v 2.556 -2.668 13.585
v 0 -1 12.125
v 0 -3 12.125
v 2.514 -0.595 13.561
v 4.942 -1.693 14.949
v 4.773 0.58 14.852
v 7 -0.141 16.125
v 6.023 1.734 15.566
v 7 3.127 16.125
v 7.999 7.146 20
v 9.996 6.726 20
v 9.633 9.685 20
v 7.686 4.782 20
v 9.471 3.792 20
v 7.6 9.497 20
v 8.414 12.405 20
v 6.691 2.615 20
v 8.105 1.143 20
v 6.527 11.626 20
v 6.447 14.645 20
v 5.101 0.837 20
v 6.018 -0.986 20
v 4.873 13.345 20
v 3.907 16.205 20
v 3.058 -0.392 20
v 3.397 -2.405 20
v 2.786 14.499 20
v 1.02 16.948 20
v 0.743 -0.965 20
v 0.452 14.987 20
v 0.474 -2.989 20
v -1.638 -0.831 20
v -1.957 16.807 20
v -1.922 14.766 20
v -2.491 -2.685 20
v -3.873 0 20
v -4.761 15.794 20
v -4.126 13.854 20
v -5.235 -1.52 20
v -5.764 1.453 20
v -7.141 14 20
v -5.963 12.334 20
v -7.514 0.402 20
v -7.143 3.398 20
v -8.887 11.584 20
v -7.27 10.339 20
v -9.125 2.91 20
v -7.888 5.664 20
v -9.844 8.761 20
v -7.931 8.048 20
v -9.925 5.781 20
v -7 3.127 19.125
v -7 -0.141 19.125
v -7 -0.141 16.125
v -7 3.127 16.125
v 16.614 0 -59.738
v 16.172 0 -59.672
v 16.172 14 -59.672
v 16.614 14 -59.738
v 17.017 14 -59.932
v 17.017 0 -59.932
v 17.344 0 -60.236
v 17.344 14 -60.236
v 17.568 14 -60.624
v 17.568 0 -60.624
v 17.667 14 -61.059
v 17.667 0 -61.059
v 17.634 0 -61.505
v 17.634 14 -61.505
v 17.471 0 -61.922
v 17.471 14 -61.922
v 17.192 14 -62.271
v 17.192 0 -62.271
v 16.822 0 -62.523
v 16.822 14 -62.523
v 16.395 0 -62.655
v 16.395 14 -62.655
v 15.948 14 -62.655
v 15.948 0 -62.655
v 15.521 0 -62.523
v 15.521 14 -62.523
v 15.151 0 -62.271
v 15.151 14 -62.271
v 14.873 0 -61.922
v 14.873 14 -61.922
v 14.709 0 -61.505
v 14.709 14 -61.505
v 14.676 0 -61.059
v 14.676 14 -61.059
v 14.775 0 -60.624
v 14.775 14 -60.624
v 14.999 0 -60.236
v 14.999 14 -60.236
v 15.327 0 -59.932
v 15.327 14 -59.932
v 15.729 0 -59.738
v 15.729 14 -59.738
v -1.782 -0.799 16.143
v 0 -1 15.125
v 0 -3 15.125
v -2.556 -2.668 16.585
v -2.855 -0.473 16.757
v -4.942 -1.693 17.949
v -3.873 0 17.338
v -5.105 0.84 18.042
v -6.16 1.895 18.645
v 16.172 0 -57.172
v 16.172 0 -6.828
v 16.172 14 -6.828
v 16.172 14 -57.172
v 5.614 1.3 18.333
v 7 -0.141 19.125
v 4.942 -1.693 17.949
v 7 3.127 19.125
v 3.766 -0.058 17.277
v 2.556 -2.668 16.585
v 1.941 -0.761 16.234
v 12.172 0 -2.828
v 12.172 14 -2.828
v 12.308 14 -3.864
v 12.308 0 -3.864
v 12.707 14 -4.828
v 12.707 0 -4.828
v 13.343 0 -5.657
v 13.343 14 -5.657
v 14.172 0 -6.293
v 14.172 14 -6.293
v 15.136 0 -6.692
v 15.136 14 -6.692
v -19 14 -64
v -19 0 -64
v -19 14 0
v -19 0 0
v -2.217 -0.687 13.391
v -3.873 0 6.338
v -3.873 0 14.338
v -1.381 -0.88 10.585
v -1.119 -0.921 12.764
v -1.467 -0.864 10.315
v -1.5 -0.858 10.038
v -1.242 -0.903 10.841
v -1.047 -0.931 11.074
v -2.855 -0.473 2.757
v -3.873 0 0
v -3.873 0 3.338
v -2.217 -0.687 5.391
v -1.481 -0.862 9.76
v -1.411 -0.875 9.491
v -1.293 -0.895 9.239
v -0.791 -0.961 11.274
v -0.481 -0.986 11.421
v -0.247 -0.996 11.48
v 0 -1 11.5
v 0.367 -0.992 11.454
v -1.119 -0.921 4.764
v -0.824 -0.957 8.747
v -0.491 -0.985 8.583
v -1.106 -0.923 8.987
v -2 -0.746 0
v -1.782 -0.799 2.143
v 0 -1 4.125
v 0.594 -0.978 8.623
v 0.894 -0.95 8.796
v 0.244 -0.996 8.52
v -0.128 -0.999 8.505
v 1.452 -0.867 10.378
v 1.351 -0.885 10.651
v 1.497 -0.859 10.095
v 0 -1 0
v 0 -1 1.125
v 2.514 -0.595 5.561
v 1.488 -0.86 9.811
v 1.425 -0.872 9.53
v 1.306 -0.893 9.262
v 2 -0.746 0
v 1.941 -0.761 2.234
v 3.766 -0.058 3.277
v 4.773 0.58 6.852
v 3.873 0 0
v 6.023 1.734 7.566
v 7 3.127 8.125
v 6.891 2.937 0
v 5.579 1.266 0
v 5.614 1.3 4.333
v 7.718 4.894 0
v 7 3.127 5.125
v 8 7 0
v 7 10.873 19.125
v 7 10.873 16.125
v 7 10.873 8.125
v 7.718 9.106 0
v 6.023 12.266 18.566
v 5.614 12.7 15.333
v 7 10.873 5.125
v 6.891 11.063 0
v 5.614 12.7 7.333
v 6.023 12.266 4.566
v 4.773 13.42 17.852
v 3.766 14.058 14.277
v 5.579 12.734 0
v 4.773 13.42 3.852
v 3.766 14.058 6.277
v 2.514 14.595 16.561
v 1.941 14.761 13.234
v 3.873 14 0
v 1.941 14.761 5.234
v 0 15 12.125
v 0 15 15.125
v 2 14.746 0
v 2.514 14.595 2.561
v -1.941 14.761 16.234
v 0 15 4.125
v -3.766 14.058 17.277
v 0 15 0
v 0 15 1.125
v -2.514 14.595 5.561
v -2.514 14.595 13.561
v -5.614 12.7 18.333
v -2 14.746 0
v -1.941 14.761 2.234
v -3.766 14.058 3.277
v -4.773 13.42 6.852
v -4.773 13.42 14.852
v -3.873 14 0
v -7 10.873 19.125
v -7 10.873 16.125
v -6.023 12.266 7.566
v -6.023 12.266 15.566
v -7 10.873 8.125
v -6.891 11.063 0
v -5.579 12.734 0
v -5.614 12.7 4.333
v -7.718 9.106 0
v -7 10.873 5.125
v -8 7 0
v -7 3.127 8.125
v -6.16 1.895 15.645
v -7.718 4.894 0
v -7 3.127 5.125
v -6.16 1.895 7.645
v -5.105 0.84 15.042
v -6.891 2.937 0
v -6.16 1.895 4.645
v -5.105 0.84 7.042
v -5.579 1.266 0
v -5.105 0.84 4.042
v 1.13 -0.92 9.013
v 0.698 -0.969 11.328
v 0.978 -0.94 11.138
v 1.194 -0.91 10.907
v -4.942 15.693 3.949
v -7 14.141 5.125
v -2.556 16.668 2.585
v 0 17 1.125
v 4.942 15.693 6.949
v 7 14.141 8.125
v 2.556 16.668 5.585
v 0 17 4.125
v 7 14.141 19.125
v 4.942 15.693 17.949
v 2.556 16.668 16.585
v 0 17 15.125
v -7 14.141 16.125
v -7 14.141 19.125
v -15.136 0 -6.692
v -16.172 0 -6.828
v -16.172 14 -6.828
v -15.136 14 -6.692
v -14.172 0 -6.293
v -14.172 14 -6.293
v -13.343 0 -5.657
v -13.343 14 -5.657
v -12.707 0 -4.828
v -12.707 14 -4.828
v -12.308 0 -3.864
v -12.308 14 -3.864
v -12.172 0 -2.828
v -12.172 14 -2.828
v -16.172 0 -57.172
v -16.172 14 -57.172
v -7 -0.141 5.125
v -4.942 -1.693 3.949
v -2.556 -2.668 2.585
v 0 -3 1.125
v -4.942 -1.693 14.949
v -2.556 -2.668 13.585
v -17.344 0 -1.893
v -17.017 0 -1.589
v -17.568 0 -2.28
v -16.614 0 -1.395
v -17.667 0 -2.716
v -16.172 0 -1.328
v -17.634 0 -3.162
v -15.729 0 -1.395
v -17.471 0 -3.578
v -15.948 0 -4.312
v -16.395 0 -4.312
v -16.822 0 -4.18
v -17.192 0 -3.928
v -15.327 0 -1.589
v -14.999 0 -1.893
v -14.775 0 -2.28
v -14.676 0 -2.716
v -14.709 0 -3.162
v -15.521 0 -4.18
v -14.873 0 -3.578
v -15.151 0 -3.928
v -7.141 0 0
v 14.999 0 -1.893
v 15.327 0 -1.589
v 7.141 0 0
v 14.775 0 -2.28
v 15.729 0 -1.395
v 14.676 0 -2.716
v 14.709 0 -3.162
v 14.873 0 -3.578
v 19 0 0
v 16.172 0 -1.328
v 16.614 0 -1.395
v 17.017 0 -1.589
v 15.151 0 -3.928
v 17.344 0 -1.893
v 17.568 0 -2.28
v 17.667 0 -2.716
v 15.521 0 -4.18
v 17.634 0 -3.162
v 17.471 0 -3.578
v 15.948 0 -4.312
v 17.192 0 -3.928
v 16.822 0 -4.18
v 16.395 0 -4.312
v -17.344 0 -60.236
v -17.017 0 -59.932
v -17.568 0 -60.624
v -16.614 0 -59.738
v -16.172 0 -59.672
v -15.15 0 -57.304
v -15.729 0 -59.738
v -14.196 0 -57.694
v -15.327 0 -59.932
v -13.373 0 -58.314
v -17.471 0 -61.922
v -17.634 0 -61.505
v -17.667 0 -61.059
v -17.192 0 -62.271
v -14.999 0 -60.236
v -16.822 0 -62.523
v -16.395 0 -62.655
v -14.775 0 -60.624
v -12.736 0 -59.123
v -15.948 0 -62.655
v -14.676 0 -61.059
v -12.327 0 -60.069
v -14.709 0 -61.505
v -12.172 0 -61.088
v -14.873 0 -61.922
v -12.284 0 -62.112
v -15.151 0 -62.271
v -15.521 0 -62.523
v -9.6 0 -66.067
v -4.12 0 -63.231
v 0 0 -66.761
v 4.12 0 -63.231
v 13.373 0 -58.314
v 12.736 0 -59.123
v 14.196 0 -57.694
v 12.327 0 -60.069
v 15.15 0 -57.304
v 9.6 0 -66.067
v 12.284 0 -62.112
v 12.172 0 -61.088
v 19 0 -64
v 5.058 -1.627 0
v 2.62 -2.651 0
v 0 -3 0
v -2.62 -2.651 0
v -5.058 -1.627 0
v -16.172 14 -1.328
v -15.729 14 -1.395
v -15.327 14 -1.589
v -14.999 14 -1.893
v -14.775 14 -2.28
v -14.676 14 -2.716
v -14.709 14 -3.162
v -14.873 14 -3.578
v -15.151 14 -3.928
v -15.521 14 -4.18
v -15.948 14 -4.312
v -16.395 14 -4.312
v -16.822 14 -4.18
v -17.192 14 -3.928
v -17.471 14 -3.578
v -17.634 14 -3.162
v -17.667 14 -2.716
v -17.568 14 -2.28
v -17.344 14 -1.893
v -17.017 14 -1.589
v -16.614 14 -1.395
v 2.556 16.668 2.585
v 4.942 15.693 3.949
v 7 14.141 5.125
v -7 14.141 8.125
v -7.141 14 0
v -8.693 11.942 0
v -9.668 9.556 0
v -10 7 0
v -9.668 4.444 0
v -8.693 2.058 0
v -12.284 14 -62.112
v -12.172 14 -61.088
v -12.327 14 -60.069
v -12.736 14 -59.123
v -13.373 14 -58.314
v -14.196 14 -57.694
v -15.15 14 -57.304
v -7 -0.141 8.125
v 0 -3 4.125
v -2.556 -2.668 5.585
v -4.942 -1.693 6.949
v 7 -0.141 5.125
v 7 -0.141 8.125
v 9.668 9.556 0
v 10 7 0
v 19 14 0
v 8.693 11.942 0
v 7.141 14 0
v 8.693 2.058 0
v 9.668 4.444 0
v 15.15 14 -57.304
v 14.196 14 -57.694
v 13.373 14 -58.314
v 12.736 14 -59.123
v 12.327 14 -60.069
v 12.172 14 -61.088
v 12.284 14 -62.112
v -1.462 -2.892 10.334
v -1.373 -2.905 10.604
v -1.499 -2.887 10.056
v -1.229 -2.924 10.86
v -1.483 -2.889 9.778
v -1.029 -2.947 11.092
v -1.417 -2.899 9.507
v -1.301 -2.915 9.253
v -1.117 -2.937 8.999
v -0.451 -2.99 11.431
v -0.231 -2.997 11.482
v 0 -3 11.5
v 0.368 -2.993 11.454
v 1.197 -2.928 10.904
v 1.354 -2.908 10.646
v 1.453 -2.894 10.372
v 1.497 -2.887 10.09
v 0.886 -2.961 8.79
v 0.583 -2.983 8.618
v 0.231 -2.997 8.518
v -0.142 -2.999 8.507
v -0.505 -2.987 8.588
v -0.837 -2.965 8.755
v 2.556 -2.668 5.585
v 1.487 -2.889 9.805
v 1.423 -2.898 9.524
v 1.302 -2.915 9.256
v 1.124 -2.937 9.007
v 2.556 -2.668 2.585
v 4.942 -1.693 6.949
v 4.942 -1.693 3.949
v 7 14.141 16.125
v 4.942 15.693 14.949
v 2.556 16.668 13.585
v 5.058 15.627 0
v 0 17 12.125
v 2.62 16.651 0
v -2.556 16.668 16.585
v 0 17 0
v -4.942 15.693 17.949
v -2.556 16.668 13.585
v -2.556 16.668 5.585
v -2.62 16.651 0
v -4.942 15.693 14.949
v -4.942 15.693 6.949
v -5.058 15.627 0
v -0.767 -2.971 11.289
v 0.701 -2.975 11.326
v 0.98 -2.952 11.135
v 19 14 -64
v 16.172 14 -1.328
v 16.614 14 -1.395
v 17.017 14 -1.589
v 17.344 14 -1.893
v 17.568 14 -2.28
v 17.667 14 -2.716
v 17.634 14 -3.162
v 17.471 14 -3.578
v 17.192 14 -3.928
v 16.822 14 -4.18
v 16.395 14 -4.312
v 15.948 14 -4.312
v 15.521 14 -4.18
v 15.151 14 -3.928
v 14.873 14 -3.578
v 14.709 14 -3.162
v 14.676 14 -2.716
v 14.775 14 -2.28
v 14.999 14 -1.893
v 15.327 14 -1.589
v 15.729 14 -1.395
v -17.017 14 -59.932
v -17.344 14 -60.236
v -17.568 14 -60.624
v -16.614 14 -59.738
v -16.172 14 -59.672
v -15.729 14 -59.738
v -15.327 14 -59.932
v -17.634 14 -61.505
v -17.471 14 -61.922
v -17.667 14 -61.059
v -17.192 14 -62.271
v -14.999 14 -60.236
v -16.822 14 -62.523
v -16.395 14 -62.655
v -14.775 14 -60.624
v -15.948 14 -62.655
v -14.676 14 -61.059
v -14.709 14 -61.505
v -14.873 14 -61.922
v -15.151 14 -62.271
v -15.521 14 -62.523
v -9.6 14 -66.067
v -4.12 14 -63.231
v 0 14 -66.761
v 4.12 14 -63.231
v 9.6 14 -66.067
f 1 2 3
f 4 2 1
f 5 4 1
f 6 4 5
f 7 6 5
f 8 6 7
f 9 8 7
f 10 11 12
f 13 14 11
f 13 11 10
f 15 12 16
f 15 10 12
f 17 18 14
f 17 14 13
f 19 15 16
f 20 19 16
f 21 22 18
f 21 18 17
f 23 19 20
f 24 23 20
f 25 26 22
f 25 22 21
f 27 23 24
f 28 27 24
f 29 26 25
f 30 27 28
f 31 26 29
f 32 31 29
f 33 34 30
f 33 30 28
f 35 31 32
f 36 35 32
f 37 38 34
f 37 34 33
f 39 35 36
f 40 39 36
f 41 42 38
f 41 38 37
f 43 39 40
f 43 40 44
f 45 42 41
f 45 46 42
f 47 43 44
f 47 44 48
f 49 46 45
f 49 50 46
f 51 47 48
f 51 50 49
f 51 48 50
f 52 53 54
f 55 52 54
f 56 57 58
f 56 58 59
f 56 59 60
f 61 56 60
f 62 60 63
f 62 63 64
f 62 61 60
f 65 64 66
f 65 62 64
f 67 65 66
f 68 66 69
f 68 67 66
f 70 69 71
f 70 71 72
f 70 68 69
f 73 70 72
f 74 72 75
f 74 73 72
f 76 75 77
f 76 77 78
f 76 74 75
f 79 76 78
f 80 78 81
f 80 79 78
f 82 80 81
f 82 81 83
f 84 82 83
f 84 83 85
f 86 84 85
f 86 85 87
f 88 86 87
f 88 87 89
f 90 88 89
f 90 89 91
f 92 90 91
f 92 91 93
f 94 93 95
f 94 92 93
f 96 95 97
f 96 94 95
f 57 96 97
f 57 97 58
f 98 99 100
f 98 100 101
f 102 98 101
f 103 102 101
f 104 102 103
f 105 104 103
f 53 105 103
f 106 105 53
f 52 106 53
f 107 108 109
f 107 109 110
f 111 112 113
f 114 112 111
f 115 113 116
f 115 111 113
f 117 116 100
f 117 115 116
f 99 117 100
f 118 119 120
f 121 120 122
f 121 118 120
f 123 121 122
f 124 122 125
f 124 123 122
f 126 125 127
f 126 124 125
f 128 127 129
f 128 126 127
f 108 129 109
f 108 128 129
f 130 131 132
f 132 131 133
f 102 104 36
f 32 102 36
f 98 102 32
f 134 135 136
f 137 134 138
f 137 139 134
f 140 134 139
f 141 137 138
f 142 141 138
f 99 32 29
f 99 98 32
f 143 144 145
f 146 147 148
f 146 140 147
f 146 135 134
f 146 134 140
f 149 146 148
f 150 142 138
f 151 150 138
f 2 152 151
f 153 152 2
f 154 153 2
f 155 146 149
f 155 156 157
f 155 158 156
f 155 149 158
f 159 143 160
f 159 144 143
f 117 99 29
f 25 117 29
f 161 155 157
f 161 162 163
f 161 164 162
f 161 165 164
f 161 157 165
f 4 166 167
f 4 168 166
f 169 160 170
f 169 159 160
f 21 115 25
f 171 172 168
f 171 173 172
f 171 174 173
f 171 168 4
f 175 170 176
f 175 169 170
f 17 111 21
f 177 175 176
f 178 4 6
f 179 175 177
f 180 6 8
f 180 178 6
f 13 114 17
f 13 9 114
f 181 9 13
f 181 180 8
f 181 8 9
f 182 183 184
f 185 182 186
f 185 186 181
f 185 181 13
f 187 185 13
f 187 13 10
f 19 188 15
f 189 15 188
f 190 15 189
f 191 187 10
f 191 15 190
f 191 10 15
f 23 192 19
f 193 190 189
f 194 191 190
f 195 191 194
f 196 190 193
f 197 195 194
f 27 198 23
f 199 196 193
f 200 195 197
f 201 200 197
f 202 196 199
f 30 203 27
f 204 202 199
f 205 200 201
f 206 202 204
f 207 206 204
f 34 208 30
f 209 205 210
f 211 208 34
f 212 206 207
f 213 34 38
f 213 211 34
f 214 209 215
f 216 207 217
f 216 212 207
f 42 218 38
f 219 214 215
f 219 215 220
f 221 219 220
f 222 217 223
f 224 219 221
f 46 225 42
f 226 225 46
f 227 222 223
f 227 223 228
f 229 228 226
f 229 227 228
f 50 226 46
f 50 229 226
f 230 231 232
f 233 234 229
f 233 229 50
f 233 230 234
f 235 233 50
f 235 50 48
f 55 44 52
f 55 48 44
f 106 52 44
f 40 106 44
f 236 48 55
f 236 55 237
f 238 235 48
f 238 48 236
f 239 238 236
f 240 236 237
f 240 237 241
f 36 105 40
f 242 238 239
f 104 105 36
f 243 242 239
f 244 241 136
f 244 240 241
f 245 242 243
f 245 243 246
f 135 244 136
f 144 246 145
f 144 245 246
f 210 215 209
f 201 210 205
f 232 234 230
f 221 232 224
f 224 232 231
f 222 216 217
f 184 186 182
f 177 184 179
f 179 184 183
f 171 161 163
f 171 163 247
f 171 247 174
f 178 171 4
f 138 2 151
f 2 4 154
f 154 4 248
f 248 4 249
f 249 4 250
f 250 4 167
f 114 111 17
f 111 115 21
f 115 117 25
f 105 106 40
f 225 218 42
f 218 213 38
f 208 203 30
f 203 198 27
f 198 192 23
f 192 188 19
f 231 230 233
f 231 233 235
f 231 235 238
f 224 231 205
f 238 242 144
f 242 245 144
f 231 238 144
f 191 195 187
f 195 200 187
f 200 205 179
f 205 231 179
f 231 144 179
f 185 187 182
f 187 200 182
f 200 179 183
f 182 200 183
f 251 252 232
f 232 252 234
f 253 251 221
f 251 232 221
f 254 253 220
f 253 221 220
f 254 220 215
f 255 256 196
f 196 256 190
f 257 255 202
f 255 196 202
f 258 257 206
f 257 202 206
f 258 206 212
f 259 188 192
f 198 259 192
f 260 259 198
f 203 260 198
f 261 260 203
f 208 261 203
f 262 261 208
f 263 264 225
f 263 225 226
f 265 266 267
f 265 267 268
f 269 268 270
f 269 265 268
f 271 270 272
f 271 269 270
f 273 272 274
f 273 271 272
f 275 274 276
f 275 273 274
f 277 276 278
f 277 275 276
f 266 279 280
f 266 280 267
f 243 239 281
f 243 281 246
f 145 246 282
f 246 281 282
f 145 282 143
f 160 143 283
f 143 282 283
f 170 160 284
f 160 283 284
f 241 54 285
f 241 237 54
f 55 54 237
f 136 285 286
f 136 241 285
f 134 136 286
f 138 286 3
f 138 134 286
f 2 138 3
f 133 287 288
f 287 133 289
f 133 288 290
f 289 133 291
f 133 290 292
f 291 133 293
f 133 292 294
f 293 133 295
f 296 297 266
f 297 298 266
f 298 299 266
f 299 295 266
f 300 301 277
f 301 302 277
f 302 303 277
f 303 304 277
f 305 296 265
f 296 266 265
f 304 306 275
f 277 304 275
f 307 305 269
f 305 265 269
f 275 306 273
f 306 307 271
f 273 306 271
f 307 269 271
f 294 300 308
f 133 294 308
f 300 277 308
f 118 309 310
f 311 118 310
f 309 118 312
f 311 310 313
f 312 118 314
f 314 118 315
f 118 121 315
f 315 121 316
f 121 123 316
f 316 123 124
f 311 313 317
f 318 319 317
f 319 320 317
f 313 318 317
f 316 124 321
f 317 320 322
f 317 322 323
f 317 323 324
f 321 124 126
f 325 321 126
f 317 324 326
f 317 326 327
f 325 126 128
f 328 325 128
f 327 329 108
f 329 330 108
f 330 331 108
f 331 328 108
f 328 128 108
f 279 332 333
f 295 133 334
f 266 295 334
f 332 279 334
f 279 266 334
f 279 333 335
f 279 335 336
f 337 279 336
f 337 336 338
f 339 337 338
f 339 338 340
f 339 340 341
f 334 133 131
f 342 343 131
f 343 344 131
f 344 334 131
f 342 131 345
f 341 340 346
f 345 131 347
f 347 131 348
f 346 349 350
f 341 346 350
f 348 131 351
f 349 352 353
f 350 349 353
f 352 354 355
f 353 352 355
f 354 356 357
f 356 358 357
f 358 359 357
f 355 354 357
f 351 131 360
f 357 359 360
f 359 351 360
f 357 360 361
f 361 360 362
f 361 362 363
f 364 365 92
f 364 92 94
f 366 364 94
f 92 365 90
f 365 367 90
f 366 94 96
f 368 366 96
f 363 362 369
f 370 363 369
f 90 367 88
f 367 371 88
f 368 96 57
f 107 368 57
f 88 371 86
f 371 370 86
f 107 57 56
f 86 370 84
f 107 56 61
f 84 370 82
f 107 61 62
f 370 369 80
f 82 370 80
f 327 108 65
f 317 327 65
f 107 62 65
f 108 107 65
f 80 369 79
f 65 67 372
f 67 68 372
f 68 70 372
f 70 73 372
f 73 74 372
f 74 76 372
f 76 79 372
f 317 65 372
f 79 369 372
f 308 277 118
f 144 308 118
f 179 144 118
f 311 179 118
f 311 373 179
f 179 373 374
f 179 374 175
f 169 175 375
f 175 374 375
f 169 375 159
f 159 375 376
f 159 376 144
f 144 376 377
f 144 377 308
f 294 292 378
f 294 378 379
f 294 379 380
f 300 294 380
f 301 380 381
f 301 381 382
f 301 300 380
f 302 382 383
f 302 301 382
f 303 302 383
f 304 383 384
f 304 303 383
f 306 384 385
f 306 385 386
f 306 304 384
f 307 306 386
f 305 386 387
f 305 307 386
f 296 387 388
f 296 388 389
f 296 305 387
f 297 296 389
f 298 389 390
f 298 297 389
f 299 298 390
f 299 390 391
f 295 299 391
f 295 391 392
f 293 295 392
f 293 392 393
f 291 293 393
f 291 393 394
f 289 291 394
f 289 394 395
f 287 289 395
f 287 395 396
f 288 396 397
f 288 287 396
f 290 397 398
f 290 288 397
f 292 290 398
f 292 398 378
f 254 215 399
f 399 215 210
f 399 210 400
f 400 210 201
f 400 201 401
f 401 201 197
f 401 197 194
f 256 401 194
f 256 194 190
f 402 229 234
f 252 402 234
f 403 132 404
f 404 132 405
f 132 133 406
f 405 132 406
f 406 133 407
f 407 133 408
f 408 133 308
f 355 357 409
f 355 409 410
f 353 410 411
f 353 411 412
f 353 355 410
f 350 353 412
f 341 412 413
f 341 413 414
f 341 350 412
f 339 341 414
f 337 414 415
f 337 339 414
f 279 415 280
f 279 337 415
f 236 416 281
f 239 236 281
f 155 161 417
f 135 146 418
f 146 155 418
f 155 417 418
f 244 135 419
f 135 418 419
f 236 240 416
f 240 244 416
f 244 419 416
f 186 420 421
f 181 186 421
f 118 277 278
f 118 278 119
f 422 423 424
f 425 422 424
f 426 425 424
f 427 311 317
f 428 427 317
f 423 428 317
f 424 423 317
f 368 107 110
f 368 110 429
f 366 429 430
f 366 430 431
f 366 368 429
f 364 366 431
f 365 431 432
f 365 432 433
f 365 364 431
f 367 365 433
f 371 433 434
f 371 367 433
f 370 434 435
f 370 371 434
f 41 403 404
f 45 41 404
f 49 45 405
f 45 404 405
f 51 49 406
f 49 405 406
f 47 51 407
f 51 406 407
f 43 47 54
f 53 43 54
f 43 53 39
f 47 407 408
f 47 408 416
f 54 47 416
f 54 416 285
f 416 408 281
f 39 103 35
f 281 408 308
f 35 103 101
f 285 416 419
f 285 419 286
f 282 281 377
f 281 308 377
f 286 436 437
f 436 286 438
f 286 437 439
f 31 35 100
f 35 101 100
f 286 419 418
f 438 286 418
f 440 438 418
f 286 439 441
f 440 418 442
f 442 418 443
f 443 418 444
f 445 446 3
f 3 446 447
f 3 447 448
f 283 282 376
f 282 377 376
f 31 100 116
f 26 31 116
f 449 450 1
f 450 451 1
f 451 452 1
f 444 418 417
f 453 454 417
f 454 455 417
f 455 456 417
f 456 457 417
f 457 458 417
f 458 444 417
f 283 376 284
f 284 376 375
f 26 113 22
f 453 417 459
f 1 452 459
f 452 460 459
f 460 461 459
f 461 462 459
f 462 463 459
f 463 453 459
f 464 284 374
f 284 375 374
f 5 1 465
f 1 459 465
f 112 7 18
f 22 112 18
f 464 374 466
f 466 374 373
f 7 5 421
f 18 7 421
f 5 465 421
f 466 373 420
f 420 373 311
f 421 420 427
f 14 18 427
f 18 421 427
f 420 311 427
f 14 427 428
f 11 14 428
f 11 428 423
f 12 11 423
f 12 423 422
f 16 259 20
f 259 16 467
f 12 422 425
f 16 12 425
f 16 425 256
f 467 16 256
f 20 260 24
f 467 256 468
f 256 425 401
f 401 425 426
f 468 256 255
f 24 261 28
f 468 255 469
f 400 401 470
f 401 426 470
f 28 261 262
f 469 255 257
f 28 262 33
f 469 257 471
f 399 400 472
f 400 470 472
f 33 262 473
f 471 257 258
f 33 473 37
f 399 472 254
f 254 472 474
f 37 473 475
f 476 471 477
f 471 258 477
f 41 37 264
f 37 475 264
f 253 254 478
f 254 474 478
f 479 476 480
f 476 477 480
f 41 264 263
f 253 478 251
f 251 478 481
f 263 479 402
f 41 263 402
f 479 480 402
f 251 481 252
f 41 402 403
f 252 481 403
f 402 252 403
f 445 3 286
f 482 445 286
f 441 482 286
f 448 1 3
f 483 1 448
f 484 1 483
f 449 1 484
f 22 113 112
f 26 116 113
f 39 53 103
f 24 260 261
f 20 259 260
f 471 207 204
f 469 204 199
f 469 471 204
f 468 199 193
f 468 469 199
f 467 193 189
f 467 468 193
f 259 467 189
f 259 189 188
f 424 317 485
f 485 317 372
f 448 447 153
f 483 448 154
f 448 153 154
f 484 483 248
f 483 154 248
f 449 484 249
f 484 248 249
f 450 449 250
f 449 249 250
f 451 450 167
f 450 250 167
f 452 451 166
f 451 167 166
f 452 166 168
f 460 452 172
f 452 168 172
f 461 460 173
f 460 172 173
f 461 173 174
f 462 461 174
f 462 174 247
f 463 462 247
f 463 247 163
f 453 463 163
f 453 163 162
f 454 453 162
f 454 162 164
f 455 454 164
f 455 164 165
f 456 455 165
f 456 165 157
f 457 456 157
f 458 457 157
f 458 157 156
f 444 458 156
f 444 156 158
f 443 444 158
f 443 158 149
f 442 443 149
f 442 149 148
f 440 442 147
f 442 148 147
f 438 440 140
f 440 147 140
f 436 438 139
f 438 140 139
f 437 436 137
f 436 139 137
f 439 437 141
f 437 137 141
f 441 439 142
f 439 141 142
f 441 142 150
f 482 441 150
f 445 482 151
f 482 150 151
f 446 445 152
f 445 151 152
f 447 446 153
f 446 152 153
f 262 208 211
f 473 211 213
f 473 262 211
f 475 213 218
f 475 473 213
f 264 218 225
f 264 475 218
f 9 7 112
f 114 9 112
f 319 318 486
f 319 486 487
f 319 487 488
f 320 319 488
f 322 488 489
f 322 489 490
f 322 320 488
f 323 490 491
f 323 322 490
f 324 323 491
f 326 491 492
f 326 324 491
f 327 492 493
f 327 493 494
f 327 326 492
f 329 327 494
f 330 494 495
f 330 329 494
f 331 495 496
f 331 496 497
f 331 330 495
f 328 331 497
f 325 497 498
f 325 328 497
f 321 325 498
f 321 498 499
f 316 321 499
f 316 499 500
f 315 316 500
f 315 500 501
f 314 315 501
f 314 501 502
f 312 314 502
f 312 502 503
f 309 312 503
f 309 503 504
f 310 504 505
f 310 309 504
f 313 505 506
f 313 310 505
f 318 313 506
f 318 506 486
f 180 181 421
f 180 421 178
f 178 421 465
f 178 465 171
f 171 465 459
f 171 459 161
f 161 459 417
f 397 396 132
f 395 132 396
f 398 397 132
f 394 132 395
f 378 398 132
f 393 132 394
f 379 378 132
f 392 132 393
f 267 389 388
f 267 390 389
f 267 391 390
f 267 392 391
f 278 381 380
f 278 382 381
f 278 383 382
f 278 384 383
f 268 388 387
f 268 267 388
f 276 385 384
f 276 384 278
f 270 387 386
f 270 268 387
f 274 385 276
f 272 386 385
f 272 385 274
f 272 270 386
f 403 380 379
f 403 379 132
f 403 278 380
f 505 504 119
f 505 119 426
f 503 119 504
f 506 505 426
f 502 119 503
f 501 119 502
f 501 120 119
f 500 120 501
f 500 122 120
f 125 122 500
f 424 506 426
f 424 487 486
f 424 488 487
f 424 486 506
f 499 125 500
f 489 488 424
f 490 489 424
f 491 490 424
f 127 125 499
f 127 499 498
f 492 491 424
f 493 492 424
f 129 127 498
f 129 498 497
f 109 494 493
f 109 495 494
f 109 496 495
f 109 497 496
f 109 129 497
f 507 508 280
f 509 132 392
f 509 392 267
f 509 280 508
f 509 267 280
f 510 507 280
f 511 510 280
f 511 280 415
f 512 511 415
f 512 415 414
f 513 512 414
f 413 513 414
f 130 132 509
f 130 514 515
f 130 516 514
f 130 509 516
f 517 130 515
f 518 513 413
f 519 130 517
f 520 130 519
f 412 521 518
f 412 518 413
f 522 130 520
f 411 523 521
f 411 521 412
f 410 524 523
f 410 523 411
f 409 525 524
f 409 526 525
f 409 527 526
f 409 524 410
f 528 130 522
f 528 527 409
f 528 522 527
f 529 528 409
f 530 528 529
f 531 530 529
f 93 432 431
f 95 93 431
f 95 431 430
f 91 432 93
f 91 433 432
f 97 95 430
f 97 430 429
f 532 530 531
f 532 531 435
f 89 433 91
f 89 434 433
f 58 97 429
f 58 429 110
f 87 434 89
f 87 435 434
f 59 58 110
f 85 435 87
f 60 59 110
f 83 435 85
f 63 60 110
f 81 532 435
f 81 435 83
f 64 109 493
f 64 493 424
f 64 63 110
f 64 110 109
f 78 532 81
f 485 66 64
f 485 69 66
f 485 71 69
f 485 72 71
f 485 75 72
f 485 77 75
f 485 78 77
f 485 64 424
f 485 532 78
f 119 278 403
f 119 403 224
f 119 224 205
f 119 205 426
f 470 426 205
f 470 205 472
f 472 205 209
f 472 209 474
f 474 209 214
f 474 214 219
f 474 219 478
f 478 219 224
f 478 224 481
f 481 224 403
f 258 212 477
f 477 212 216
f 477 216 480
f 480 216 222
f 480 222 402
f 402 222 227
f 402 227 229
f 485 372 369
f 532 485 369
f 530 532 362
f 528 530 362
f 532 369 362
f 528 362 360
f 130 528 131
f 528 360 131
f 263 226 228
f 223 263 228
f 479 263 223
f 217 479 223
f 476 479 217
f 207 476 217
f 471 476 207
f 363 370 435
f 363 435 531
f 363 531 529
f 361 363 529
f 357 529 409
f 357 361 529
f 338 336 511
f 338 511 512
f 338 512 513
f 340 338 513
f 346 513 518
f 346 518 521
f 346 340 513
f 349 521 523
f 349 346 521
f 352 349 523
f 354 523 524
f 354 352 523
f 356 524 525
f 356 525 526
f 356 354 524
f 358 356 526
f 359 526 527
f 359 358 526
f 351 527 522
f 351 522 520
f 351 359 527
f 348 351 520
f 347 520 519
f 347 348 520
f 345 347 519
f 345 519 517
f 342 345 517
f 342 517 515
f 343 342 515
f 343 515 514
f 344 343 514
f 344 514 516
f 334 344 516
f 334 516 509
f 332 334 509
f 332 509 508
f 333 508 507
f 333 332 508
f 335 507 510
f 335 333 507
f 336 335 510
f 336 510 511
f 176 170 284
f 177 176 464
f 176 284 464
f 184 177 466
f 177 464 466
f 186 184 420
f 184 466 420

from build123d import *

# Parameters (mm, degrees)
SKETCH_1_R          = 1.5
EXTRUDE_1_DEPTH     = 14
SKETCH_2_R          = 10
SKETCH_2_R_2        = 8
EXTRUDE_2_DEPTH     = 20
CUT_EXTRUDE_4_DEPTH = 20
SKETCH_6_R          = 1.5
CUT_EXTRUDE_5_DEPTH = 10


with BuildPart() as part:
    # 草图1 → 凸台-拉伸1 (new body)
    with BuildSketch(Plane(origin=(0, 0, 0), x_dir=(1, 0, 0), z_dir=(0, 1, 0))):
        with BuildLine():
            Line((0, 0), (19, 0))
            Line((19, 0), (19, 64))
            ThreePointArc((19, 64), (0, 66.760766922), (-19, 64))
            Line((-19, 64), (-19, 0))
            Line((-19, 0), (0, 0))
        make_face()
        with Locations(Location((-16.171572875, 61.171572875, 0), (0, 0, 270))):
            Circle(SKETCH_1_R, mode=Mode.SUBTRACT)
        with Locations(Location((16.171572875, 61.171572875, 0), (0, 0, 270))):
            Circle(SKETCH_1_R, mode=Mode.SUBTRACT)
        with Locations(Location((-16.171572875, 2.828427125, 0), (0, 0, 270))):
            Circle(SKETCH_1_R, mode=Mode.SUBTRACT)
        with Locations(Location((16.171572875, 2.828427125, 0), (0, 0, 270))):
            Circle(SKETCH_1_R, mode=Mode.SUBTRACT)
        with BuildLine():
            Line((-16.171572875, 57.171572875), (-16.171572875, 6.828427125))
            ThreePointArc((-16.171572875, 6.828427125), (-13.343145751, 5.656854249), (-12.171572875, 2.828427125))
            Line((-12.171572875, 2.828427125), (12.171572875, 2.828427125))
            ThreePointArc((12.171572875, 2.828427125), (13.343145751, 5.656854249), (16.171572875, 6.828427125))
            Line((16.171572875, 6.828427125), (16.171572875, 57.171572875))
            ThreePointArc((16.171572875, 57.171572875), (13.0281615, 58.697918711), (12.283716556, 62.112090413))
            ThreePointArc((12.283716556, 62.112090413), (0, 63.371324523), (-12.283716556, 62.112090413))
            ThreePointArc((-12.283716556, 62.112090413), (-13.0281615, 58.697918711), (-16.171572875, 57.171572875))
        make_face(mode=Mode.SUBTRACT)
    extrude(amount=EXTRUDE_1_DEPTH)

    # 草图2 → 凸台-拉伸2 (add)
    with BuildSketch(Plane.XY):
        with Locations(Location((0, 7, 0), (0, 0, 135.572995999))):
            Circle(SKETCH_2_R)
        with Locations(Location((0, 7, 0), (0, 0, 241.044975628))):
            Circle(SKETCH_2_R_2, mode=Mode.SUBTRACT)
    extrude(amount=EXTRUDE_2_DEPTH)

    # 草图3 → 切除-拉伸4 (cut, symmetric)
    with BuildSketch(Plane(origin=(0, 0, 0), x_dir=(1, 0, 0), z_dir=(0, 1, 0))):
        Polygon((0, -1.124822793), (7, -5.124822793), (7, -8.124822793), (0, -4.124822793), (-7, -8.124822793), (-7, -5.124822793), align=None)
        Polygon((0, -12.124822793), (7, -16.124822793), (7, -19.124822793), (0, -15.124822793), (-7, -19.124822793), (-7, -16.124822793), align=None)
    extrude(amount=CUT_EXTRUDE_4_DEPTH, both=True, mode=Mode.SUBTRACT)

    # 草图6 → 切除-拉伸5 (cut)
    with BuildSketch(Plane(origin=(0, 0, 0), x_dir=(1, 0, 0), z_dir=(0, 1, 0))):
        with Locations(Location((0, -10, 0), (0, 0, 270))):
            Circle(SKETCH_6_R)
    extrude(amount=-CUT_EXTRUDE_5_DEPTH, mode=Mode.SUBTRACT)


solid = part.part
